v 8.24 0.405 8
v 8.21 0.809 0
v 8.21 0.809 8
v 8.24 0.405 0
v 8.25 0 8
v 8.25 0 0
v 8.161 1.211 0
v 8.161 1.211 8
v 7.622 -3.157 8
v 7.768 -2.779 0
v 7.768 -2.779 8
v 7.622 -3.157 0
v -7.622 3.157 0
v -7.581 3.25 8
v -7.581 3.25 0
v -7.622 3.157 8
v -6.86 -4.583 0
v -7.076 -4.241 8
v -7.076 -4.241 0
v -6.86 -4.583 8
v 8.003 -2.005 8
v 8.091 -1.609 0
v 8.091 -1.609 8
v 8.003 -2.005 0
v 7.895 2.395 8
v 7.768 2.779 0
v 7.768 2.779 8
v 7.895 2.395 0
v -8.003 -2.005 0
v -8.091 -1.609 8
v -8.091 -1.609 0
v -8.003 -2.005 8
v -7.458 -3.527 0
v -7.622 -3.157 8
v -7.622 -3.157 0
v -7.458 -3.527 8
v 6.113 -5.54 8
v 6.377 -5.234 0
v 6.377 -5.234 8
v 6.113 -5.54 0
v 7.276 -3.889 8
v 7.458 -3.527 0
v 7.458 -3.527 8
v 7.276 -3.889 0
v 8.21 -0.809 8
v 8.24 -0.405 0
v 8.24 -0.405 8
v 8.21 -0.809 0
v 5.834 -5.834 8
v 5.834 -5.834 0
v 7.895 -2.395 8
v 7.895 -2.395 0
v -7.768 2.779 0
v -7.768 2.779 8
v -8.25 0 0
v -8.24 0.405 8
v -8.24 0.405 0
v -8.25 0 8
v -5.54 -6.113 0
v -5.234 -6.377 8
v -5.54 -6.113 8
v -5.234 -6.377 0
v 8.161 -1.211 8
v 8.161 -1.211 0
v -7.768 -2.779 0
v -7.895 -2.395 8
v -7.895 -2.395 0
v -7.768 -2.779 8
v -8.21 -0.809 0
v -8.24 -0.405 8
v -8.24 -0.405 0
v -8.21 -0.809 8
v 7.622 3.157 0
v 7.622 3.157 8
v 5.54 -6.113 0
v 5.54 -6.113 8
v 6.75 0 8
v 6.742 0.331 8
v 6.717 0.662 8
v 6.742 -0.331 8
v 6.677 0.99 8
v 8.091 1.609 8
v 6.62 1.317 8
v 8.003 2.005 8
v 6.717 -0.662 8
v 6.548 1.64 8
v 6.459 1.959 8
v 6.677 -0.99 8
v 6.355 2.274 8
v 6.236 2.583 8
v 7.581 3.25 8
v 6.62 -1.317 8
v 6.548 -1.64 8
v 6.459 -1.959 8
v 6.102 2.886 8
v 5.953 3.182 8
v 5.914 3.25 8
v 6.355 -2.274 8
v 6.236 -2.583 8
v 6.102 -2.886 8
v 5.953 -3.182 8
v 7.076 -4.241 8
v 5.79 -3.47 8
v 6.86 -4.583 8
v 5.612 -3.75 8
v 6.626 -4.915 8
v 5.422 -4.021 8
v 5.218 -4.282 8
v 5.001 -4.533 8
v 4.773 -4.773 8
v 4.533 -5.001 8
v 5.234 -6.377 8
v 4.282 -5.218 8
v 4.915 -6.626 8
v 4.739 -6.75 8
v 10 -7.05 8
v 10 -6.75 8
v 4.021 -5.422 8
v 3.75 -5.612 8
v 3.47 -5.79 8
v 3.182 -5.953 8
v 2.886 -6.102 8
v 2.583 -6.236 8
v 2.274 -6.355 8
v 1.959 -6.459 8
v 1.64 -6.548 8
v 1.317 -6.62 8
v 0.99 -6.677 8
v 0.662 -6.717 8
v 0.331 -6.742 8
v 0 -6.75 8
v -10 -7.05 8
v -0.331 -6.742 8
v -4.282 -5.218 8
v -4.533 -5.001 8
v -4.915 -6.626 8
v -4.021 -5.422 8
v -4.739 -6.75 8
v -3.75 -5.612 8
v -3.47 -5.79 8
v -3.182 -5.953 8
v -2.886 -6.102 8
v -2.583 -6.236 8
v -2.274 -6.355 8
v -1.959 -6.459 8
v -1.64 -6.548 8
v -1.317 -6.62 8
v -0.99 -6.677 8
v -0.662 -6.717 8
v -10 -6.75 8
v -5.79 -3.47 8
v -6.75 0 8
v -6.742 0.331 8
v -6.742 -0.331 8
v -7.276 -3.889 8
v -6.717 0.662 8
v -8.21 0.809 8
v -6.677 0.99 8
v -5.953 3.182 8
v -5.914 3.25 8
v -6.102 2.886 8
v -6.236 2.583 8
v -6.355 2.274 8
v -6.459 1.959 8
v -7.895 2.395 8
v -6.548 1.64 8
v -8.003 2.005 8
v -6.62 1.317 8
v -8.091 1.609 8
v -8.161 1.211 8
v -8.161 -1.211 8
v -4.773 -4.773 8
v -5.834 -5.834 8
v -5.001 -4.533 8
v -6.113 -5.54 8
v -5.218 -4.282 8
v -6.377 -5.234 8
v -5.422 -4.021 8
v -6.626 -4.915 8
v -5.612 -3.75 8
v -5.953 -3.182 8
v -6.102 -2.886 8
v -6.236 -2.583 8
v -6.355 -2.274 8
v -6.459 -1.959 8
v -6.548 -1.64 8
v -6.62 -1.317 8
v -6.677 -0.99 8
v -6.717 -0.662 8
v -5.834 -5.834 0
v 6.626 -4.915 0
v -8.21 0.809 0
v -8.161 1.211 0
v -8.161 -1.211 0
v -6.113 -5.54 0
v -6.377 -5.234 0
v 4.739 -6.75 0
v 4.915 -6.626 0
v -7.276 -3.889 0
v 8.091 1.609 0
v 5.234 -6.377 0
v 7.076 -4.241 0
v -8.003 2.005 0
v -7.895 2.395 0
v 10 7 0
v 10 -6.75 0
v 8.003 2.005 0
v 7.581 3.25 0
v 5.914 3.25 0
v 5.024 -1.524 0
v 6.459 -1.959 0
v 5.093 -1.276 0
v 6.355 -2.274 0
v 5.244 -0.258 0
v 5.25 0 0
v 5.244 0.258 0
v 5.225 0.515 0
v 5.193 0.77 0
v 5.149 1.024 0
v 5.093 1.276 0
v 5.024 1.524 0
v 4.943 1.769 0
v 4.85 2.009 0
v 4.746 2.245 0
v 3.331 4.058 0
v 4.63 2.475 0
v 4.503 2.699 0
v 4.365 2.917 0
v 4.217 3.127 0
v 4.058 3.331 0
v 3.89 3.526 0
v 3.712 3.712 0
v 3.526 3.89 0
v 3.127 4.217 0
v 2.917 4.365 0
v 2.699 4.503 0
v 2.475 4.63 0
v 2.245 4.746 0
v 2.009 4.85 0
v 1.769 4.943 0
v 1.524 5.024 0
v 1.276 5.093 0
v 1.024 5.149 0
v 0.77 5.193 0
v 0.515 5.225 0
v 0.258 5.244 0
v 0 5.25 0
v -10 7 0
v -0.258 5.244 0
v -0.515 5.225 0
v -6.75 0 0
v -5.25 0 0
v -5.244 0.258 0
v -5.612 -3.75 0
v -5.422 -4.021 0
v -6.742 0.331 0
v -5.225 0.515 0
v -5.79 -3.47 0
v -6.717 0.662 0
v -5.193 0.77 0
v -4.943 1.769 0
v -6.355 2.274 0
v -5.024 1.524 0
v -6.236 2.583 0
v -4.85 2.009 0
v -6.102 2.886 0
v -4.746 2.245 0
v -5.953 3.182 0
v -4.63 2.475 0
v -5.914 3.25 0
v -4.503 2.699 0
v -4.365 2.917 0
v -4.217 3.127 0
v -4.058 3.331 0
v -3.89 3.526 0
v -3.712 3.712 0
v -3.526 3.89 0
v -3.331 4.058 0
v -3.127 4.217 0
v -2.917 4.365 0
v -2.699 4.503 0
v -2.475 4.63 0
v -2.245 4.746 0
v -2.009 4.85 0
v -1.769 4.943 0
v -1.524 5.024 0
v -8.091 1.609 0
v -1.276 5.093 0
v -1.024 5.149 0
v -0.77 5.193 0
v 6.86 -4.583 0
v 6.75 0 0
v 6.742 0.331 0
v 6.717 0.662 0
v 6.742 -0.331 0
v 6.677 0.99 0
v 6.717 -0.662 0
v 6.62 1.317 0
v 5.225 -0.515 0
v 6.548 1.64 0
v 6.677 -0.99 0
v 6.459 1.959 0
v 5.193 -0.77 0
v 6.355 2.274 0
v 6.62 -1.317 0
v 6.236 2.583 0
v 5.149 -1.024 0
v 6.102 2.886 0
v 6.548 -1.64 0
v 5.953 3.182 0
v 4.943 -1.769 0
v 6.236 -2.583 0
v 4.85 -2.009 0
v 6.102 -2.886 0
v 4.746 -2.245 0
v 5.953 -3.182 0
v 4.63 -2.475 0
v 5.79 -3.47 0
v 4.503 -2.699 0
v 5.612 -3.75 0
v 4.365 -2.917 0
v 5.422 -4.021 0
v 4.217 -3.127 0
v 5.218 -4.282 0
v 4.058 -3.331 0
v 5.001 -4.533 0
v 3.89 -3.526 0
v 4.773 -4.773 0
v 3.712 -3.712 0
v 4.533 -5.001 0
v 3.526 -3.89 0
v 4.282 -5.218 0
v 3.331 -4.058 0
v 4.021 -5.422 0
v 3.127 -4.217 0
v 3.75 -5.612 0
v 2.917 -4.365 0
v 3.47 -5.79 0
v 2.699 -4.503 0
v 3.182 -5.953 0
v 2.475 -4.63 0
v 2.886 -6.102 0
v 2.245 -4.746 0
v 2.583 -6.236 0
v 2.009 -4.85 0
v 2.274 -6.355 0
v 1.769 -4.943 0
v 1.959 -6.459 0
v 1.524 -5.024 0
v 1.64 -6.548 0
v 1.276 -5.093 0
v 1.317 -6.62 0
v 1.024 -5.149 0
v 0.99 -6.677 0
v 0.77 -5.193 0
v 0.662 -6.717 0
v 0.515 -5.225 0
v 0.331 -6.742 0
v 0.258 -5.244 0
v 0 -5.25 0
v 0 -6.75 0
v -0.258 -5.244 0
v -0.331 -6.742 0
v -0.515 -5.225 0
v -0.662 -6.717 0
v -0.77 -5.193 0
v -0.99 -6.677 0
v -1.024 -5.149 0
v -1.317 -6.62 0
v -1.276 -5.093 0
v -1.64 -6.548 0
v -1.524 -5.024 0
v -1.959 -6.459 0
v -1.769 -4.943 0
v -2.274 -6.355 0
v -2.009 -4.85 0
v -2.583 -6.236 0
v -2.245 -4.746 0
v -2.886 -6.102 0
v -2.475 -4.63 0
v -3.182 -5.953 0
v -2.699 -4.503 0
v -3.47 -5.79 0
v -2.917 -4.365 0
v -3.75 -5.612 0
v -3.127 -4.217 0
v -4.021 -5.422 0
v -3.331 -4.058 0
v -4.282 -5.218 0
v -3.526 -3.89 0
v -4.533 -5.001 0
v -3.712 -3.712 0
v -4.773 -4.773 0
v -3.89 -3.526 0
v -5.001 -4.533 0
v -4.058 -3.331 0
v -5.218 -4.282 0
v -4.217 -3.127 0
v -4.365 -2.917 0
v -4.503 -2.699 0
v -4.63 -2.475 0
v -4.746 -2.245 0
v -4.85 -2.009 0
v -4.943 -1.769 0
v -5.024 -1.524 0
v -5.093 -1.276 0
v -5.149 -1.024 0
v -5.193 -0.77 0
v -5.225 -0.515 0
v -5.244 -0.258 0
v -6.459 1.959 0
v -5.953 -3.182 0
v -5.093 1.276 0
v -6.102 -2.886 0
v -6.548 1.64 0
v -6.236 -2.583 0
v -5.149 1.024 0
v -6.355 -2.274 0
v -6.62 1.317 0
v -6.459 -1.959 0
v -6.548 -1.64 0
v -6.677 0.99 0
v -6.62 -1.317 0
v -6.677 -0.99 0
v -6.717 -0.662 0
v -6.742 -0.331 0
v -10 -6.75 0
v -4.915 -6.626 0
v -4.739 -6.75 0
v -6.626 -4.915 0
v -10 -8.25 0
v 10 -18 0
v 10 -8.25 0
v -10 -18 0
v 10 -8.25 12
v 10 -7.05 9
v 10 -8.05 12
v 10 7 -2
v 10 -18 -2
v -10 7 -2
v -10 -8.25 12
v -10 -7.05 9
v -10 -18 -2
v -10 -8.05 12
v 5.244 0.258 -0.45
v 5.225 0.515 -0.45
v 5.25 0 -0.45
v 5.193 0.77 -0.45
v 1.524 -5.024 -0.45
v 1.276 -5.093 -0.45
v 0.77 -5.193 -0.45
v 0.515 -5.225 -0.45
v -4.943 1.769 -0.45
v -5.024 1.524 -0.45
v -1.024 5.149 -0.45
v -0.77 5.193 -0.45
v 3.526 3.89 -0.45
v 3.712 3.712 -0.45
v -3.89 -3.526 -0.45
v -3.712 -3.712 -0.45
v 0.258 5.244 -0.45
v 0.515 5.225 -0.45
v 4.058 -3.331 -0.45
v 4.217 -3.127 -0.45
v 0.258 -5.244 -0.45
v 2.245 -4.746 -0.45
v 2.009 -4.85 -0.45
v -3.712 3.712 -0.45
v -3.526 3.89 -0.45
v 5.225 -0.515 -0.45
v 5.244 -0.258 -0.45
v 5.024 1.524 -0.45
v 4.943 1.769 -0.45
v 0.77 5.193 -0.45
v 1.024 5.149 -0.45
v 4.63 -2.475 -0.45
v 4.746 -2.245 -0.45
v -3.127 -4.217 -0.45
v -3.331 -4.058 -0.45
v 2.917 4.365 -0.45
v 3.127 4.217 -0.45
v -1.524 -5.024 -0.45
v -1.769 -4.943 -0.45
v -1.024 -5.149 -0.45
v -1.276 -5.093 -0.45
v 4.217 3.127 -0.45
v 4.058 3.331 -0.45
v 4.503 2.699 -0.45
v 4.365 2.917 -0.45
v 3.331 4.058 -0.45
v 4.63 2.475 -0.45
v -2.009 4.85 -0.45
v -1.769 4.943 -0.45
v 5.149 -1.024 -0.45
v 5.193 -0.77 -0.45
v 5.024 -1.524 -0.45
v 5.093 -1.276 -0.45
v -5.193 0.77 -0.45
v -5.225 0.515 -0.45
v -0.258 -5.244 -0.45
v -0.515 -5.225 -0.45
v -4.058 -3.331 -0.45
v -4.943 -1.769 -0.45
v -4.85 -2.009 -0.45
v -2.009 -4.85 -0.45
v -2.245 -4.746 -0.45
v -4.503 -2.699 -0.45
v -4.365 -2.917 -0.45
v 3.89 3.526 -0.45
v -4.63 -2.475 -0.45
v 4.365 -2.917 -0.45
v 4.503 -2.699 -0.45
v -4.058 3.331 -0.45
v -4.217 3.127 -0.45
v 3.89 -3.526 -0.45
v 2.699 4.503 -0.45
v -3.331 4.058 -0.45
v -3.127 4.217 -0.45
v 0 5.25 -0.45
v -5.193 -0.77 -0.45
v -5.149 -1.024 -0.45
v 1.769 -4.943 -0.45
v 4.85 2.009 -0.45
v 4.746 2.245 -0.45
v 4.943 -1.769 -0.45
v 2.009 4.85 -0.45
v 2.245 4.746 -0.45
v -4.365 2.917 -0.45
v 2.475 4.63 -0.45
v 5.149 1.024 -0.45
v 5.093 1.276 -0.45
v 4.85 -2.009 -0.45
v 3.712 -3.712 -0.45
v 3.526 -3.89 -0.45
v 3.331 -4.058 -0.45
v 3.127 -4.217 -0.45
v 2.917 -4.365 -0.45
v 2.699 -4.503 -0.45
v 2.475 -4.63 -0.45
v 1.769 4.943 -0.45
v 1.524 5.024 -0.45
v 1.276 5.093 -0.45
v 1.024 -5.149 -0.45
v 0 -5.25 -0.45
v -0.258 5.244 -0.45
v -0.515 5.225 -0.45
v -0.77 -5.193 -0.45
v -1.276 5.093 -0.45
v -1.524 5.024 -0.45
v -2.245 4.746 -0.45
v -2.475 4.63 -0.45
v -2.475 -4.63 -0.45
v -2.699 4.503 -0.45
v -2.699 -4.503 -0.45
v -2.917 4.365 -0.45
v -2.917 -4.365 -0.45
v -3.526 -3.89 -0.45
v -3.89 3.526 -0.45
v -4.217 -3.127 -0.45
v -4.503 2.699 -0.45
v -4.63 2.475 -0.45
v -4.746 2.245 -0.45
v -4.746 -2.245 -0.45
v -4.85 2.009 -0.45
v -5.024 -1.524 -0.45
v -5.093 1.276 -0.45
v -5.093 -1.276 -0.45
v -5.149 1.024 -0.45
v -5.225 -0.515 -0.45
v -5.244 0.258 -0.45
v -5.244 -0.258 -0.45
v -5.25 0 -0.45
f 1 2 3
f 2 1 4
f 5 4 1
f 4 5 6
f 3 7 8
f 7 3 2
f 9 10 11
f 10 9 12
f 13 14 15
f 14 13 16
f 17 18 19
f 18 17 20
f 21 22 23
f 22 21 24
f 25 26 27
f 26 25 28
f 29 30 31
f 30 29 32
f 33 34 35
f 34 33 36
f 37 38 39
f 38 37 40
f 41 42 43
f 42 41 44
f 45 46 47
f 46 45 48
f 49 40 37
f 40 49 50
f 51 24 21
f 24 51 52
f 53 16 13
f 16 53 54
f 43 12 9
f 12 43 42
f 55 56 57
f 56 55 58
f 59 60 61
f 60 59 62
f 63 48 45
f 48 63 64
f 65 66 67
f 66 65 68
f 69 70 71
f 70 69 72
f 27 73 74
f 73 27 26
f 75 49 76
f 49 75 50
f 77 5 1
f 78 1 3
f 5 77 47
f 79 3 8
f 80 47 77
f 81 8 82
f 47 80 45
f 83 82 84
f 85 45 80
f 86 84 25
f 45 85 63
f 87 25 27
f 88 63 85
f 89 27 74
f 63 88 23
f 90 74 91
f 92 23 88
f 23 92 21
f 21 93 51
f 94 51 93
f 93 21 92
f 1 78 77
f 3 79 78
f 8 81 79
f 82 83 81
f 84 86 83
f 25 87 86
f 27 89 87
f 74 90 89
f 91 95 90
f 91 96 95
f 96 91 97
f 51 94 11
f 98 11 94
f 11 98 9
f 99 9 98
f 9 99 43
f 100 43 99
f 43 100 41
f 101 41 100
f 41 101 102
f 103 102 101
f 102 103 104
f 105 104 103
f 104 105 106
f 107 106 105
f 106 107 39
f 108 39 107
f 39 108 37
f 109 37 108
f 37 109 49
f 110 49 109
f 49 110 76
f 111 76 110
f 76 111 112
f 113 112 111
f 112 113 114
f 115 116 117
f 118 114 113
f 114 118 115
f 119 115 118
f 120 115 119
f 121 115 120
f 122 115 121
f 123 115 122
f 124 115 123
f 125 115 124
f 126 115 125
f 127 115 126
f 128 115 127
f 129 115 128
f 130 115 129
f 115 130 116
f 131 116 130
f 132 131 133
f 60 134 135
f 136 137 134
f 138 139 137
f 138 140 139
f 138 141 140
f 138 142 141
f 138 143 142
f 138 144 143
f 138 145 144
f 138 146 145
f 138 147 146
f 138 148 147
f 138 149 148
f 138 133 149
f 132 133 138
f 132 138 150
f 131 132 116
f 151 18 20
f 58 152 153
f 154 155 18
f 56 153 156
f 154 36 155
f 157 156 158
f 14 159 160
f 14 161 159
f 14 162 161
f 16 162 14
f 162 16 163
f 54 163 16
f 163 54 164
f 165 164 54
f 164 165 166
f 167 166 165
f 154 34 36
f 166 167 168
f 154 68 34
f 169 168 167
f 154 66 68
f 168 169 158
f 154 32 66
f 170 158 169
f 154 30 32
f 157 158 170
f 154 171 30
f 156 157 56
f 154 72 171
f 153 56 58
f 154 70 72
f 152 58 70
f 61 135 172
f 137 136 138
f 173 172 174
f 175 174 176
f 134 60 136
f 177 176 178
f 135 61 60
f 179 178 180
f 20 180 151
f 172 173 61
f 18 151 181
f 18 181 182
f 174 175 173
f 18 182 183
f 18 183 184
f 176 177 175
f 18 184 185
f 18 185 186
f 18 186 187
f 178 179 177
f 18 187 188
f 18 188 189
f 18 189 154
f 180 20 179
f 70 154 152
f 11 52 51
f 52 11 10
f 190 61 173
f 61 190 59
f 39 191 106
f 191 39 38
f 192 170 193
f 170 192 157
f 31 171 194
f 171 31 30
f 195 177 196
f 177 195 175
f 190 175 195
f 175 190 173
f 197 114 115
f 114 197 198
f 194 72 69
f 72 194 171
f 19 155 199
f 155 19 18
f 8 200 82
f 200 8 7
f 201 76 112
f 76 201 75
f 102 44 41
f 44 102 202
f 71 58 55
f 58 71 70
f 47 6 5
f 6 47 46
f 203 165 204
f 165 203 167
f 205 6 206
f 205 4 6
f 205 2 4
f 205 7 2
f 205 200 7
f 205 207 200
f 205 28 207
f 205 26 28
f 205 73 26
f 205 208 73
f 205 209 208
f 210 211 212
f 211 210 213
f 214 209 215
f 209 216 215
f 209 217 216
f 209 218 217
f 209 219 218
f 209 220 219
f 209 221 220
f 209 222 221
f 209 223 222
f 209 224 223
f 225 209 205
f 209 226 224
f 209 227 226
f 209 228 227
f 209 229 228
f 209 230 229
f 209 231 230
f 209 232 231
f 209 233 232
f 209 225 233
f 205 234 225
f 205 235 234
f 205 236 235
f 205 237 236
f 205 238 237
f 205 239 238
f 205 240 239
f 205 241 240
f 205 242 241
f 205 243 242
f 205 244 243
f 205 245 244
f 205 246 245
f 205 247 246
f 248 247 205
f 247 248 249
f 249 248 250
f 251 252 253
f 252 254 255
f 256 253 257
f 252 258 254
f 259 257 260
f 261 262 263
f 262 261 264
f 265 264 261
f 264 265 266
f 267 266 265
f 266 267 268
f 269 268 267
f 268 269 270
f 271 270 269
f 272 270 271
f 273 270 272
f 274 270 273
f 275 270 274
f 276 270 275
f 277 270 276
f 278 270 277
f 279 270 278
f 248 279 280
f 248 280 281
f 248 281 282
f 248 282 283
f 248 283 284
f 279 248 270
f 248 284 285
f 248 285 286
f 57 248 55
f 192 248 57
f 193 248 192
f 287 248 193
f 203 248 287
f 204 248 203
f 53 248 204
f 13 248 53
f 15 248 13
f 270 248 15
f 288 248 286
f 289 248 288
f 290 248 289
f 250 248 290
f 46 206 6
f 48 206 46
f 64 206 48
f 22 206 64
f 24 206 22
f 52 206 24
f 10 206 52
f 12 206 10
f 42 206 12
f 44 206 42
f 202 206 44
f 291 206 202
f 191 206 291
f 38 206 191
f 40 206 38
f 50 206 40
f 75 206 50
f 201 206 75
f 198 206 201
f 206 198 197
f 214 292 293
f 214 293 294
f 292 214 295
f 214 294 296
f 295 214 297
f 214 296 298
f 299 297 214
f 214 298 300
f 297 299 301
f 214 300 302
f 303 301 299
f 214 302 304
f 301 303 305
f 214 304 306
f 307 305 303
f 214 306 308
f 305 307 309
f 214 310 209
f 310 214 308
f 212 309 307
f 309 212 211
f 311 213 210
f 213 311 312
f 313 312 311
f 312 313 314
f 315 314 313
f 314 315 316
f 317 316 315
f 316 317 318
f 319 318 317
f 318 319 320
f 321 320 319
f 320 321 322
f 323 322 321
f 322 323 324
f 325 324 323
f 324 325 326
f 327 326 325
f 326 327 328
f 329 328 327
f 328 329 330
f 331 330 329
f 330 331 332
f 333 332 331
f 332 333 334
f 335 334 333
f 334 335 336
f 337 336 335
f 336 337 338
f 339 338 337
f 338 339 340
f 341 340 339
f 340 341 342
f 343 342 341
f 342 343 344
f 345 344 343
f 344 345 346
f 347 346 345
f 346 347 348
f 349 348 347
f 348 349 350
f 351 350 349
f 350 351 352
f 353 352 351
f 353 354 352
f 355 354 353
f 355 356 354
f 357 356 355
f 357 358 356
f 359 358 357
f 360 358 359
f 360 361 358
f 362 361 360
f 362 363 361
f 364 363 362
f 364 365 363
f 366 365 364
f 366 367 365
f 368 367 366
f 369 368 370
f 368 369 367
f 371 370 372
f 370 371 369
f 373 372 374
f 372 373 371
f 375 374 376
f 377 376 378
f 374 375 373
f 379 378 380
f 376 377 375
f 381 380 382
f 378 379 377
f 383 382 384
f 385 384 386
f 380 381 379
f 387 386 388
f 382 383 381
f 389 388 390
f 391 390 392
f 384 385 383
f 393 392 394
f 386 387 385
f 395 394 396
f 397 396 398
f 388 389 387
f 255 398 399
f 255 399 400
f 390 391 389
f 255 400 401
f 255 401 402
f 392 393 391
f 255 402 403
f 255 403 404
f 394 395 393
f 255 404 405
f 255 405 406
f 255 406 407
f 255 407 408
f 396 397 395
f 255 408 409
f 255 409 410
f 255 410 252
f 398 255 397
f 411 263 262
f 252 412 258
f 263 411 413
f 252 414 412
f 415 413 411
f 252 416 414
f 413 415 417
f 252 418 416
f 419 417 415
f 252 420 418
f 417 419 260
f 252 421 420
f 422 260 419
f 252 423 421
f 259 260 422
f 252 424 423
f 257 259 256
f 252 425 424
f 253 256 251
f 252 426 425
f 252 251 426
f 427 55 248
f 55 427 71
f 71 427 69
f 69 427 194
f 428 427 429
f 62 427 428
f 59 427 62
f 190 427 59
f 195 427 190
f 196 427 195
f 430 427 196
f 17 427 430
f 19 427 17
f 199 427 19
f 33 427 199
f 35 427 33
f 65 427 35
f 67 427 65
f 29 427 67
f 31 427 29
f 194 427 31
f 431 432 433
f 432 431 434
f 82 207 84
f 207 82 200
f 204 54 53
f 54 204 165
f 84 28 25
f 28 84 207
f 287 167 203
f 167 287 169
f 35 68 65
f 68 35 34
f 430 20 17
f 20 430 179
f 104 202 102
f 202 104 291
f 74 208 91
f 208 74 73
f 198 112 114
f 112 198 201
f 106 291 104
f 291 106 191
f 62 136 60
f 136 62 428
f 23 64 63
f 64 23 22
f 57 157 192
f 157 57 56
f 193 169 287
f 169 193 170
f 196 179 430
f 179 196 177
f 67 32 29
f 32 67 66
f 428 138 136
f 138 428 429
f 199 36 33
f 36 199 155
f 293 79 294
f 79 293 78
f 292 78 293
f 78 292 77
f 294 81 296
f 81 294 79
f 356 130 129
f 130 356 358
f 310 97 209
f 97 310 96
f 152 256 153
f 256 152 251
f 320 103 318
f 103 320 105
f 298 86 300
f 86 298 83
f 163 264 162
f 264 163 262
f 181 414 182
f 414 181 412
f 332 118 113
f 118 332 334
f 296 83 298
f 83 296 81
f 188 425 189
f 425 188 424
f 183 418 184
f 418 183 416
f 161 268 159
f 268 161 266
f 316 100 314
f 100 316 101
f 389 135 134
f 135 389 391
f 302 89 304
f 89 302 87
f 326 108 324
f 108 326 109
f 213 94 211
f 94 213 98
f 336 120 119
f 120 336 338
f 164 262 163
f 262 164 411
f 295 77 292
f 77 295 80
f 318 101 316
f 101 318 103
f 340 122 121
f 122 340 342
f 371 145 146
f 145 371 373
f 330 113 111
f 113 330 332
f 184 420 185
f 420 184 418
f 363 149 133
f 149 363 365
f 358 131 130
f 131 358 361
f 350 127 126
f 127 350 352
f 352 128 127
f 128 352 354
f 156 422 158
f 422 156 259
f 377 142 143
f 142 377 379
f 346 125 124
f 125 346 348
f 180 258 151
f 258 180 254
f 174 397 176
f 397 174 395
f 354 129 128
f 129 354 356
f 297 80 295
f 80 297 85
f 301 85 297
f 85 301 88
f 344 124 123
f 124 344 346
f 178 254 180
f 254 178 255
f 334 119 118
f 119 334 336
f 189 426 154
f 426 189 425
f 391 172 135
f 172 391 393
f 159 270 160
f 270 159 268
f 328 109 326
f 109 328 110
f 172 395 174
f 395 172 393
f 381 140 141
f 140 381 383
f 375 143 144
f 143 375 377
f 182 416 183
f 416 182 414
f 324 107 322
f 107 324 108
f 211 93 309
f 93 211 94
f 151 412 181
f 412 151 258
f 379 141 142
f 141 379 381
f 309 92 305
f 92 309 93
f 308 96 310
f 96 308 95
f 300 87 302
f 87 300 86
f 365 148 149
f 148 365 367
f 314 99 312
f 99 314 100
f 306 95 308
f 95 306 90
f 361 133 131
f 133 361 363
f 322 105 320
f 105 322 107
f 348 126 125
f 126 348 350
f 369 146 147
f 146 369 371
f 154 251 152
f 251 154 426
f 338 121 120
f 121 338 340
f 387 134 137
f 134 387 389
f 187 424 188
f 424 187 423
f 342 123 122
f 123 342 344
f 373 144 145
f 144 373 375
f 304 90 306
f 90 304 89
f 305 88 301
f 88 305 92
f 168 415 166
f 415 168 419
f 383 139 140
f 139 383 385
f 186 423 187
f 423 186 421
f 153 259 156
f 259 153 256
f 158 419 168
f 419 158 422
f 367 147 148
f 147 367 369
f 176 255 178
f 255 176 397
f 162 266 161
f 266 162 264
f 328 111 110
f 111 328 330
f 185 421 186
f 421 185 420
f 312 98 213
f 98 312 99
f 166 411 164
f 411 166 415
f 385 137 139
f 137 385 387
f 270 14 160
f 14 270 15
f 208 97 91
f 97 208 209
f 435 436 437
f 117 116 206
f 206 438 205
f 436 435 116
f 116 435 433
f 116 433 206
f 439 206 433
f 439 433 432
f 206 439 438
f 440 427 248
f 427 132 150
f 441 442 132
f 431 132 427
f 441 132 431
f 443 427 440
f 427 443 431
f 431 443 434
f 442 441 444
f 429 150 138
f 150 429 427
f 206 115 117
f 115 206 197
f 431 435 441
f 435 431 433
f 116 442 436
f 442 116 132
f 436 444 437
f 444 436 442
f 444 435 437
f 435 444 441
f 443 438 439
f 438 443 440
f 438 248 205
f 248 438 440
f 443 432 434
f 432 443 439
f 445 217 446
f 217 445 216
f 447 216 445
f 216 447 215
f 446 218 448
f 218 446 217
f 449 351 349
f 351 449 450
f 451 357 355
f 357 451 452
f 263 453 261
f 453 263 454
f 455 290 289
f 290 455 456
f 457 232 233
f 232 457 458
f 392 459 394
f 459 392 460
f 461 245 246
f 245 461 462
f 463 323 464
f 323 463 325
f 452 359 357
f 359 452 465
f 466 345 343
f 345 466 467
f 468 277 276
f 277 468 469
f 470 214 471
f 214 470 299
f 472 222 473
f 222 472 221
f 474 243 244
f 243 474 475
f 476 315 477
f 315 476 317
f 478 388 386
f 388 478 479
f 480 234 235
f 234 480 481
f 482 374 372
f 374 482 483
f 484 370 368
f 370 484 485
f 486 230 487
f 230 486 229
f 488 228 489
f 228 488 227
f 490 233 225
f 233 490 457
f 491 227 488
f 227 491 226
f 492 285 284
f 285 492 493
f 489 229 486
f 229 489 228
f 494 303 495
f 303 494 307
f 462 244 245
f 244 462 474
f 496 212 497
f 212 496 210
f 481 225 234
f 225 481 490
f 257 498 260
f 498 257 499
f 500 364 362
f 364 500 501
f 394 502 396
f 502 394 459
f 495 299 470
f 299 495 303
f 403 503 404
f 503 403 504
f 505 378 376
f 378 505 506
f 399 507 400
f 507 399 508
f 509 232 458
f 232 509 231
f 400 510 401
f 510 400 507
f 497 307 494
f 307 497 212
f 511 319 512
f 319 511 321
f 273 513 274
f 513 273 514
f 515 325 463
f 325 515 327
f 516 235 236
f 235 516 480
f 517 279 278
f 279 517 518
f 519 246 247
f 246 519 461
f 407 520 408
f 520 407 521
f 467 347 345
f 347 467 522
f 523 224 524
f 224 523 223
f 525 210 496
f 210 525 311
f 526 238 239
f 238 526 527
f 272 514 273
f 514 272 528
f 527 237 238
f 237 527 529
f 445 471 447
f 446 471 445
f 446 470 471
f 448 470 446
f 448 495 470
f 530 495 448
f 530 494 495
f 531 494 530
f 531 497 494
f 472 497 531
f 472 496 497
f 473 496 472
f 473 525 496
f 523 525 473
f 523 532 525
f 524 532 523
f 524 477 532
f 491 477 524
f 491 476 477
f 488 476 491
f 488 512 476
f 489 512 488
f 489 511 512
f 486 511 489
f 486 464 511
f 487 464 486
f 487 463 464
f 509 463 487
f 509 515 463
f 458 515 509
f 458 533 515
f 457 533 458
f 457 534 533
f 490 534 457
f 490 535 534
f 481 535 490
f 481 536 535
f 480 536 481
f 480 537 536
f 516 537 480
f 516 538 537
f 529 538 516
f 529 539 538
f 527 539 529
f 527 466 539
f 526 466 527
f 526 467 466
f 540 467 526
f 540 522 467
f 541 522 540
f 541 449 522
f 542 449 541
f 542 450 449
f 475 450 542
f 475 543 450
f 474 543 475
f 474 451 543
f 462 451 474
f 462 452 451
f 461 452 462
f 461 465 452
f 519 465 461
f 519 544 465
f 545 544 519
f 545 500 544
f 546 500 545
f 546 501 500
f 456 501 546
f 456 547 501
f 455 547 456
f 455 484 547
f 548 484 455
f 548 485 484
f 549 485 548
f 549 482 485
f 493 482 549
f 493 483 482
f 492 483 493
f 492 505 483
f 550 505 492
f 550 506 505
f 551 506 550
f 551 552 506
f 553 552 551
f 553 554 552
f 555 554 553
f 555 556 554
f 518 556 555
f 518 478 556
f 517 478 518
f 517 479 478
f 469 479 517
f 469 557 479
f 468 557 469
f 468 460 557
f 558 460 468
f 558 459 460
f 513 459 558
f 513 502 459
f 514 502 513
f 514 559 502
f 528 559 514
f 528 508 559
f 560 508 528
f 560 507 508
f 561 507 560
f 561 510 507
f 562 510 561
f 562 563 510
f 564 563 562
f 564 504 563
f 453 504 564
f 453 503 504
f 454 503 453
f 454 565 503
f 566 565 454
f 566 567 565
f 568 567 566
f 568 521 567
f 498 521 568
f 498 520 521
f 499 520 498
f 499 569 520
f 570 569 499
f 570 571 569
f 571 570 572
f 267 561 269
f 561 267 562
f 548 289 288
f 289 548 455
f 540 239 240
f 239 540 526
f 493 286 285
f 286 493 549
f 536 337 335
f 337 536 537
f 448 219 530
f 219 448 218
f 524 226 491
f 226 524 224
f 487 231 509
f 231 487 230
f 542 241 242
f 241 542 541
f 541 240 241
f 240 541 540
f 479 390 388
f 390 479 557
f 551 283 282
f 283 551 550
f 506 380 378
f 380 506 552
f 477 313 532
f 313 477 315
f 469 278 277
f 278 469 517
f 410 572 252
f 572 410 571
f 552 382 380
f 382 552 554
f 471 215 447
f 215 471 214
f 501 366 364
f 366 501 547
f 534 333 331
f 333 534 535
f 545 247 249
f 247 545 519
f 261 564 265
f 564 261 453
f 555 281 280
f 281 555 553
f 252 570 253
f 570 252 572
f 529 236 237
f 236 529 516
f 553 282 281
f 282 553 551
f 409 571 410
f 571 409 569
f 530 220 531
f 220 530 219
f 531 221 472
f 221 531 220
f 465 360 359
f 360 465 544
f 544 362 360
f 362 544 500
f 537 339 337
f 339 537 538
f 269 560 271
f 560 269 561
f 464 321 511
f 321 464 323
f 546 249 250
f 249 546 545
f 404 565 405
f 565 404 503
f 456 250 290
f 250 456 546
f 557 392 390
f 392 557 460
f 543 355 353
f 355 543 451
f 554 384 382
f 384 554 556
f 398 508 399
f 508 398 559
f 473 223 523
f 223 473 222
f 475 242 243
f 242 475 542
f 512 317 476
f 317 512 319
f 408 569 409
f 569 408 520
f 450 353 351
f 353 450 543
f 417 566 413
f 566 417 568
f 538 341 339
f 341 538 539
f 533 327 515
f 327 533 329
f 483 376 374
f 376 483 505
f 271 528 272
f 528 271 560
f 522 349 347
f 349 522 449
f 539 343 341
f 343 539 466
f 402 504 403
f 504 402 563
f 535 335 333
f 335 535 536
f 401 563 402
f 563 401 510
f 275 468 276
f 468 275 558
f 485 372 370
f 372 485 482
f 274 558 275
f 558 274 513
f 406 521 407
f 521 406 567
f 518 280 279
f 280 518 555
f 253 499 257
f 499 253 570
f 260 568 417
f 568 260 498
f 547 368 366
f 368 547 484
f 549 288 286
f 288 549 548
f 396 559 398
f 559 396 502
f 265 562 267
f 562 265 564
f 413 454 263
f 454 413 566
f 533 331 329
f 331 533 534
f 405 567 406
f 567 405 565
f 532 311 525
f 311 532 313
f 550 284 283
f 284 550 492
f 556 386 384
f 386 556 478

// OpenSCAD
// file: ../config/colors.scad
/* RailEduKit/InteractiveSignallingLaboratory © 2025 by Martin Scheidt and contributors
 * License: CC-BY 4.0 - https://creativecommons.org/licenses/by/4.0/
 * Project description: The Interactive Signalling Laboratory is a tool for training in Rail
 * Applications to enhance the knowledge of control and signalling principles for rail transport systems.
 *
 * Module: config/colors.scad
 */

// component colors
BASE_COLOR = [0.25, 0.25, 0.25];// lighter black to see the shapes
INDICATOR_COLOR = "white";
ROUTE_COLOR = [0.255, 0.412, 0.882]; //[0.396, 0.467, 0.702];

METALLIC_GREY = [0.474, 0.482, 0.482];



// signal colors
ASPECT_CLEAR = "green";
ASPECT_APPROACH = "yellow";
ASPECT_STOP = "red";
// file: ../parts/train_integrity_body.scad
/* RailEduKit/InteractiveSignallingLaboratory © 2025 by Martin Scheidt and contributors
 * License: CC-BY 4.0 - https://creativecommons.org/licenses/by/4.0/
 * Project description: The Interactive Signalling Laboratory is a tool for training in Rail
 * Applications to enhance the knowledge of control and signalling principles for rail transport systems.
 *
 * Module: train_integrity_body
 */

// Include configuration file
include <../config/global_variables.scad>
include <../config/colors.scad>

module train_integrity_body() {
	color(BASE_COLOR) union(){
	difference() { // coupling
		// outer ring
		cylinder(h = coupling_depth, r = coupling_radius + move_tolerance / 2 + coupler_thickness);
		// inner ring
		translate([ 0, 0, -coupler_thickness / 2 ])
		cylinder(h = coupling_depth + coupler_thickness, r = coupling_radius + move_tolerance / 2);
		// cutting the lower edge
		translate([ -coupling_radius * 1.3, coupling_cut_pos, -coupler_thickness / 2 ])
		cube([ coupling_radius * 2.6, coupling_radius * 1.2, coupling_depth + coupler_thickness ]);
	}

	union() { // upper board
		// beam
		translate([ -boogie_width / 2, -(coupling_radius + coupler_thickness + move_tolerance / 2), 0 ])
		cube([ boogie_width, coupler_thickness, coupling_depth ]);
		// lipp
		hull() {
			translate([
				-boogie_width / 2, -(coupling_radius + move_tolerance / 2 + coupler_thickness - lipp_width),
				coupling_depth
			])
			cube([ boogie_width, thinnest_layer, lipp_height / 4 ]);
			translate(
			    [ -boogie_width / 2, -(coupling_radius + move_tolerance / 2 + coupler_thickness), coupling_depth ])
			cube([ boogie_width, thinnest_layer, lipp_height ]);
		}
	}

	difference() { // front shield
		translate([ -shield_width / 2, -(shield_depth) / 2 - coupling_radius + 1, -shield_thickness ]) 
		cube([ shield_width, shield_depth, shield_thickness ]);
		translate([ 0, 0, -inlay_thickness ])
		cylinder(h = inlay_thickness, r = inlay_radius);
	}
	}
}

//train_integrity_body();
// file: ../assemblies/train_integrity_symbol_front.scad
/* RailEduKit/InteractiveSignallingLaboratory © 2025 by Martin Scheidt and contributors
 * License: CC-BY 4.0 - https://creativecommons.org/licenses/by/4.0/
 * Project description: The Interactive Signalling Laboratory is a tool for training in Rail
 * Applications to enhance the knowledge of control and signalling principles for rail transport systems.
 *
 * Module: train_integrity_symbol_front
 */

// Include configuration file
include <../config/global_variables.scad>
include <../config/colors.scad>

/* PRINT INSTRUCTION
To print the train integrity you have to export the symbol and the body seperately as STL.
Then you have to select the body STL and the symbol STL and load them TOGETHER at the same time in Bambu Studio.
Thus the two files are positioned at the same place and the symbol fills the holes in the body perfectly.
Then you can select the two parts seperately to color them.
Through this procedure you can print multiple colors in one layer.
 */


module train_integrity_symbol_front() {
	color(INDICATOR_COLOR)
	translate([ -shield_width / 2, -(shield_depth) / 2 - coupling_radius + 1, -shield_thickness ])
	union() {
		translate(
		    [ (1 / 12) * shield_width + headlight_d / 2, (shield_depth + (1 / 6) * shield_width + headlight_d) / 2, 0 ])
		cylinder(d = headlight_d, h = number_height);
		translate([
			(11 / 12) * shield_width - headlight_d / 2, (shield_depth + (1 / 6) * shield_width + headlight_d) / 2, 0
		])
		cylinder(d = headlight_d, h = number_height);
		translate([ (1 / 2) * shield_width, (shield_depth - (1 / 6) * shield_width - headlight_d) / 2, 0 ])
		cylinder(d = headlight_d, h = number_height);
	}
}

train_integrity_symbol_front();
// file: ../assemblies/train_integrity_body_front.scad
/* RailEduKit/InteractiveSignallingLaboratory © 2025 by Martin Scheidt and contributors
 * License: CC-BY 4.0 - https://creativecommons.org/licenses/by/4.0/
 * Project description: The Interactive Signalling Laboratory is a tool for training in Rail
 * Applications to enhance the knowledge of control and signalling principles for rail transport systems.
 *
 * Module: train_integrity_body_front
 */

// Include configuration file
include <../config/global_variables.scad>

// include common parts
include <../parts/train_integrity_body.scad>
use <train_integrity_symbol_front.scad>

/* PRINT INSTRUCTION
To print the train integrity you have to export the symbol and the body seperately as STL.
Then you have to select the body STL and the symbol STL and load them TOGETHER at the same time in Bambu Studio.
Thus the two files are positioned at the same place and the symbol fills the holes in the body perfectly.
Then you can select the two parts seperately to color them.
Through this procedure you can print multiple colors in one layer.
 */


module train_integrity_body_front() {
	difference() {
                train_integrity_body();
                train_integrity_symbol_front();
	}
}

train_integrity_body_front();
// main file
/* RailEduKit/InteractiveSignallingLaboratory © 2025 by Martin Scheidt and contributors
 * License: CC-BY 4.0 - https://creativecommons.org/licenses/by/4.0/
 * Project description: The Interactive Signalling Laboratory is a tool for training in Rail
 * Applications to enhance the knowledge of control and signalling principles for rail transport systems.
 *
 * Module: train_integrity_front
 */

// Include configuration file
include <../config/global_variables.scad>

// use common parts
use <../assemblies/train_integrity_body_front.scad>
use <../assemblies/train_integrity_symbol_front.scad>

/* PRINT INSTRUCTION
To print the train integrity you have to export the symbol and the body seperately as STL.
Then you have to select the body STL and the symbol STL and load them TOGETHER at the same time in Bambu Studio.
Thus the two files are positioned at the same place and the symbol fills the holes in the body perfectly.
Then you can select the two parts seperately to color them.
Through this procedure you can print multiple colors in one layer.
 */

module train_integrity_front(){
    train_integrity_body_front();
    train_integrity_symbol_front();
}

train_integrity_front();
